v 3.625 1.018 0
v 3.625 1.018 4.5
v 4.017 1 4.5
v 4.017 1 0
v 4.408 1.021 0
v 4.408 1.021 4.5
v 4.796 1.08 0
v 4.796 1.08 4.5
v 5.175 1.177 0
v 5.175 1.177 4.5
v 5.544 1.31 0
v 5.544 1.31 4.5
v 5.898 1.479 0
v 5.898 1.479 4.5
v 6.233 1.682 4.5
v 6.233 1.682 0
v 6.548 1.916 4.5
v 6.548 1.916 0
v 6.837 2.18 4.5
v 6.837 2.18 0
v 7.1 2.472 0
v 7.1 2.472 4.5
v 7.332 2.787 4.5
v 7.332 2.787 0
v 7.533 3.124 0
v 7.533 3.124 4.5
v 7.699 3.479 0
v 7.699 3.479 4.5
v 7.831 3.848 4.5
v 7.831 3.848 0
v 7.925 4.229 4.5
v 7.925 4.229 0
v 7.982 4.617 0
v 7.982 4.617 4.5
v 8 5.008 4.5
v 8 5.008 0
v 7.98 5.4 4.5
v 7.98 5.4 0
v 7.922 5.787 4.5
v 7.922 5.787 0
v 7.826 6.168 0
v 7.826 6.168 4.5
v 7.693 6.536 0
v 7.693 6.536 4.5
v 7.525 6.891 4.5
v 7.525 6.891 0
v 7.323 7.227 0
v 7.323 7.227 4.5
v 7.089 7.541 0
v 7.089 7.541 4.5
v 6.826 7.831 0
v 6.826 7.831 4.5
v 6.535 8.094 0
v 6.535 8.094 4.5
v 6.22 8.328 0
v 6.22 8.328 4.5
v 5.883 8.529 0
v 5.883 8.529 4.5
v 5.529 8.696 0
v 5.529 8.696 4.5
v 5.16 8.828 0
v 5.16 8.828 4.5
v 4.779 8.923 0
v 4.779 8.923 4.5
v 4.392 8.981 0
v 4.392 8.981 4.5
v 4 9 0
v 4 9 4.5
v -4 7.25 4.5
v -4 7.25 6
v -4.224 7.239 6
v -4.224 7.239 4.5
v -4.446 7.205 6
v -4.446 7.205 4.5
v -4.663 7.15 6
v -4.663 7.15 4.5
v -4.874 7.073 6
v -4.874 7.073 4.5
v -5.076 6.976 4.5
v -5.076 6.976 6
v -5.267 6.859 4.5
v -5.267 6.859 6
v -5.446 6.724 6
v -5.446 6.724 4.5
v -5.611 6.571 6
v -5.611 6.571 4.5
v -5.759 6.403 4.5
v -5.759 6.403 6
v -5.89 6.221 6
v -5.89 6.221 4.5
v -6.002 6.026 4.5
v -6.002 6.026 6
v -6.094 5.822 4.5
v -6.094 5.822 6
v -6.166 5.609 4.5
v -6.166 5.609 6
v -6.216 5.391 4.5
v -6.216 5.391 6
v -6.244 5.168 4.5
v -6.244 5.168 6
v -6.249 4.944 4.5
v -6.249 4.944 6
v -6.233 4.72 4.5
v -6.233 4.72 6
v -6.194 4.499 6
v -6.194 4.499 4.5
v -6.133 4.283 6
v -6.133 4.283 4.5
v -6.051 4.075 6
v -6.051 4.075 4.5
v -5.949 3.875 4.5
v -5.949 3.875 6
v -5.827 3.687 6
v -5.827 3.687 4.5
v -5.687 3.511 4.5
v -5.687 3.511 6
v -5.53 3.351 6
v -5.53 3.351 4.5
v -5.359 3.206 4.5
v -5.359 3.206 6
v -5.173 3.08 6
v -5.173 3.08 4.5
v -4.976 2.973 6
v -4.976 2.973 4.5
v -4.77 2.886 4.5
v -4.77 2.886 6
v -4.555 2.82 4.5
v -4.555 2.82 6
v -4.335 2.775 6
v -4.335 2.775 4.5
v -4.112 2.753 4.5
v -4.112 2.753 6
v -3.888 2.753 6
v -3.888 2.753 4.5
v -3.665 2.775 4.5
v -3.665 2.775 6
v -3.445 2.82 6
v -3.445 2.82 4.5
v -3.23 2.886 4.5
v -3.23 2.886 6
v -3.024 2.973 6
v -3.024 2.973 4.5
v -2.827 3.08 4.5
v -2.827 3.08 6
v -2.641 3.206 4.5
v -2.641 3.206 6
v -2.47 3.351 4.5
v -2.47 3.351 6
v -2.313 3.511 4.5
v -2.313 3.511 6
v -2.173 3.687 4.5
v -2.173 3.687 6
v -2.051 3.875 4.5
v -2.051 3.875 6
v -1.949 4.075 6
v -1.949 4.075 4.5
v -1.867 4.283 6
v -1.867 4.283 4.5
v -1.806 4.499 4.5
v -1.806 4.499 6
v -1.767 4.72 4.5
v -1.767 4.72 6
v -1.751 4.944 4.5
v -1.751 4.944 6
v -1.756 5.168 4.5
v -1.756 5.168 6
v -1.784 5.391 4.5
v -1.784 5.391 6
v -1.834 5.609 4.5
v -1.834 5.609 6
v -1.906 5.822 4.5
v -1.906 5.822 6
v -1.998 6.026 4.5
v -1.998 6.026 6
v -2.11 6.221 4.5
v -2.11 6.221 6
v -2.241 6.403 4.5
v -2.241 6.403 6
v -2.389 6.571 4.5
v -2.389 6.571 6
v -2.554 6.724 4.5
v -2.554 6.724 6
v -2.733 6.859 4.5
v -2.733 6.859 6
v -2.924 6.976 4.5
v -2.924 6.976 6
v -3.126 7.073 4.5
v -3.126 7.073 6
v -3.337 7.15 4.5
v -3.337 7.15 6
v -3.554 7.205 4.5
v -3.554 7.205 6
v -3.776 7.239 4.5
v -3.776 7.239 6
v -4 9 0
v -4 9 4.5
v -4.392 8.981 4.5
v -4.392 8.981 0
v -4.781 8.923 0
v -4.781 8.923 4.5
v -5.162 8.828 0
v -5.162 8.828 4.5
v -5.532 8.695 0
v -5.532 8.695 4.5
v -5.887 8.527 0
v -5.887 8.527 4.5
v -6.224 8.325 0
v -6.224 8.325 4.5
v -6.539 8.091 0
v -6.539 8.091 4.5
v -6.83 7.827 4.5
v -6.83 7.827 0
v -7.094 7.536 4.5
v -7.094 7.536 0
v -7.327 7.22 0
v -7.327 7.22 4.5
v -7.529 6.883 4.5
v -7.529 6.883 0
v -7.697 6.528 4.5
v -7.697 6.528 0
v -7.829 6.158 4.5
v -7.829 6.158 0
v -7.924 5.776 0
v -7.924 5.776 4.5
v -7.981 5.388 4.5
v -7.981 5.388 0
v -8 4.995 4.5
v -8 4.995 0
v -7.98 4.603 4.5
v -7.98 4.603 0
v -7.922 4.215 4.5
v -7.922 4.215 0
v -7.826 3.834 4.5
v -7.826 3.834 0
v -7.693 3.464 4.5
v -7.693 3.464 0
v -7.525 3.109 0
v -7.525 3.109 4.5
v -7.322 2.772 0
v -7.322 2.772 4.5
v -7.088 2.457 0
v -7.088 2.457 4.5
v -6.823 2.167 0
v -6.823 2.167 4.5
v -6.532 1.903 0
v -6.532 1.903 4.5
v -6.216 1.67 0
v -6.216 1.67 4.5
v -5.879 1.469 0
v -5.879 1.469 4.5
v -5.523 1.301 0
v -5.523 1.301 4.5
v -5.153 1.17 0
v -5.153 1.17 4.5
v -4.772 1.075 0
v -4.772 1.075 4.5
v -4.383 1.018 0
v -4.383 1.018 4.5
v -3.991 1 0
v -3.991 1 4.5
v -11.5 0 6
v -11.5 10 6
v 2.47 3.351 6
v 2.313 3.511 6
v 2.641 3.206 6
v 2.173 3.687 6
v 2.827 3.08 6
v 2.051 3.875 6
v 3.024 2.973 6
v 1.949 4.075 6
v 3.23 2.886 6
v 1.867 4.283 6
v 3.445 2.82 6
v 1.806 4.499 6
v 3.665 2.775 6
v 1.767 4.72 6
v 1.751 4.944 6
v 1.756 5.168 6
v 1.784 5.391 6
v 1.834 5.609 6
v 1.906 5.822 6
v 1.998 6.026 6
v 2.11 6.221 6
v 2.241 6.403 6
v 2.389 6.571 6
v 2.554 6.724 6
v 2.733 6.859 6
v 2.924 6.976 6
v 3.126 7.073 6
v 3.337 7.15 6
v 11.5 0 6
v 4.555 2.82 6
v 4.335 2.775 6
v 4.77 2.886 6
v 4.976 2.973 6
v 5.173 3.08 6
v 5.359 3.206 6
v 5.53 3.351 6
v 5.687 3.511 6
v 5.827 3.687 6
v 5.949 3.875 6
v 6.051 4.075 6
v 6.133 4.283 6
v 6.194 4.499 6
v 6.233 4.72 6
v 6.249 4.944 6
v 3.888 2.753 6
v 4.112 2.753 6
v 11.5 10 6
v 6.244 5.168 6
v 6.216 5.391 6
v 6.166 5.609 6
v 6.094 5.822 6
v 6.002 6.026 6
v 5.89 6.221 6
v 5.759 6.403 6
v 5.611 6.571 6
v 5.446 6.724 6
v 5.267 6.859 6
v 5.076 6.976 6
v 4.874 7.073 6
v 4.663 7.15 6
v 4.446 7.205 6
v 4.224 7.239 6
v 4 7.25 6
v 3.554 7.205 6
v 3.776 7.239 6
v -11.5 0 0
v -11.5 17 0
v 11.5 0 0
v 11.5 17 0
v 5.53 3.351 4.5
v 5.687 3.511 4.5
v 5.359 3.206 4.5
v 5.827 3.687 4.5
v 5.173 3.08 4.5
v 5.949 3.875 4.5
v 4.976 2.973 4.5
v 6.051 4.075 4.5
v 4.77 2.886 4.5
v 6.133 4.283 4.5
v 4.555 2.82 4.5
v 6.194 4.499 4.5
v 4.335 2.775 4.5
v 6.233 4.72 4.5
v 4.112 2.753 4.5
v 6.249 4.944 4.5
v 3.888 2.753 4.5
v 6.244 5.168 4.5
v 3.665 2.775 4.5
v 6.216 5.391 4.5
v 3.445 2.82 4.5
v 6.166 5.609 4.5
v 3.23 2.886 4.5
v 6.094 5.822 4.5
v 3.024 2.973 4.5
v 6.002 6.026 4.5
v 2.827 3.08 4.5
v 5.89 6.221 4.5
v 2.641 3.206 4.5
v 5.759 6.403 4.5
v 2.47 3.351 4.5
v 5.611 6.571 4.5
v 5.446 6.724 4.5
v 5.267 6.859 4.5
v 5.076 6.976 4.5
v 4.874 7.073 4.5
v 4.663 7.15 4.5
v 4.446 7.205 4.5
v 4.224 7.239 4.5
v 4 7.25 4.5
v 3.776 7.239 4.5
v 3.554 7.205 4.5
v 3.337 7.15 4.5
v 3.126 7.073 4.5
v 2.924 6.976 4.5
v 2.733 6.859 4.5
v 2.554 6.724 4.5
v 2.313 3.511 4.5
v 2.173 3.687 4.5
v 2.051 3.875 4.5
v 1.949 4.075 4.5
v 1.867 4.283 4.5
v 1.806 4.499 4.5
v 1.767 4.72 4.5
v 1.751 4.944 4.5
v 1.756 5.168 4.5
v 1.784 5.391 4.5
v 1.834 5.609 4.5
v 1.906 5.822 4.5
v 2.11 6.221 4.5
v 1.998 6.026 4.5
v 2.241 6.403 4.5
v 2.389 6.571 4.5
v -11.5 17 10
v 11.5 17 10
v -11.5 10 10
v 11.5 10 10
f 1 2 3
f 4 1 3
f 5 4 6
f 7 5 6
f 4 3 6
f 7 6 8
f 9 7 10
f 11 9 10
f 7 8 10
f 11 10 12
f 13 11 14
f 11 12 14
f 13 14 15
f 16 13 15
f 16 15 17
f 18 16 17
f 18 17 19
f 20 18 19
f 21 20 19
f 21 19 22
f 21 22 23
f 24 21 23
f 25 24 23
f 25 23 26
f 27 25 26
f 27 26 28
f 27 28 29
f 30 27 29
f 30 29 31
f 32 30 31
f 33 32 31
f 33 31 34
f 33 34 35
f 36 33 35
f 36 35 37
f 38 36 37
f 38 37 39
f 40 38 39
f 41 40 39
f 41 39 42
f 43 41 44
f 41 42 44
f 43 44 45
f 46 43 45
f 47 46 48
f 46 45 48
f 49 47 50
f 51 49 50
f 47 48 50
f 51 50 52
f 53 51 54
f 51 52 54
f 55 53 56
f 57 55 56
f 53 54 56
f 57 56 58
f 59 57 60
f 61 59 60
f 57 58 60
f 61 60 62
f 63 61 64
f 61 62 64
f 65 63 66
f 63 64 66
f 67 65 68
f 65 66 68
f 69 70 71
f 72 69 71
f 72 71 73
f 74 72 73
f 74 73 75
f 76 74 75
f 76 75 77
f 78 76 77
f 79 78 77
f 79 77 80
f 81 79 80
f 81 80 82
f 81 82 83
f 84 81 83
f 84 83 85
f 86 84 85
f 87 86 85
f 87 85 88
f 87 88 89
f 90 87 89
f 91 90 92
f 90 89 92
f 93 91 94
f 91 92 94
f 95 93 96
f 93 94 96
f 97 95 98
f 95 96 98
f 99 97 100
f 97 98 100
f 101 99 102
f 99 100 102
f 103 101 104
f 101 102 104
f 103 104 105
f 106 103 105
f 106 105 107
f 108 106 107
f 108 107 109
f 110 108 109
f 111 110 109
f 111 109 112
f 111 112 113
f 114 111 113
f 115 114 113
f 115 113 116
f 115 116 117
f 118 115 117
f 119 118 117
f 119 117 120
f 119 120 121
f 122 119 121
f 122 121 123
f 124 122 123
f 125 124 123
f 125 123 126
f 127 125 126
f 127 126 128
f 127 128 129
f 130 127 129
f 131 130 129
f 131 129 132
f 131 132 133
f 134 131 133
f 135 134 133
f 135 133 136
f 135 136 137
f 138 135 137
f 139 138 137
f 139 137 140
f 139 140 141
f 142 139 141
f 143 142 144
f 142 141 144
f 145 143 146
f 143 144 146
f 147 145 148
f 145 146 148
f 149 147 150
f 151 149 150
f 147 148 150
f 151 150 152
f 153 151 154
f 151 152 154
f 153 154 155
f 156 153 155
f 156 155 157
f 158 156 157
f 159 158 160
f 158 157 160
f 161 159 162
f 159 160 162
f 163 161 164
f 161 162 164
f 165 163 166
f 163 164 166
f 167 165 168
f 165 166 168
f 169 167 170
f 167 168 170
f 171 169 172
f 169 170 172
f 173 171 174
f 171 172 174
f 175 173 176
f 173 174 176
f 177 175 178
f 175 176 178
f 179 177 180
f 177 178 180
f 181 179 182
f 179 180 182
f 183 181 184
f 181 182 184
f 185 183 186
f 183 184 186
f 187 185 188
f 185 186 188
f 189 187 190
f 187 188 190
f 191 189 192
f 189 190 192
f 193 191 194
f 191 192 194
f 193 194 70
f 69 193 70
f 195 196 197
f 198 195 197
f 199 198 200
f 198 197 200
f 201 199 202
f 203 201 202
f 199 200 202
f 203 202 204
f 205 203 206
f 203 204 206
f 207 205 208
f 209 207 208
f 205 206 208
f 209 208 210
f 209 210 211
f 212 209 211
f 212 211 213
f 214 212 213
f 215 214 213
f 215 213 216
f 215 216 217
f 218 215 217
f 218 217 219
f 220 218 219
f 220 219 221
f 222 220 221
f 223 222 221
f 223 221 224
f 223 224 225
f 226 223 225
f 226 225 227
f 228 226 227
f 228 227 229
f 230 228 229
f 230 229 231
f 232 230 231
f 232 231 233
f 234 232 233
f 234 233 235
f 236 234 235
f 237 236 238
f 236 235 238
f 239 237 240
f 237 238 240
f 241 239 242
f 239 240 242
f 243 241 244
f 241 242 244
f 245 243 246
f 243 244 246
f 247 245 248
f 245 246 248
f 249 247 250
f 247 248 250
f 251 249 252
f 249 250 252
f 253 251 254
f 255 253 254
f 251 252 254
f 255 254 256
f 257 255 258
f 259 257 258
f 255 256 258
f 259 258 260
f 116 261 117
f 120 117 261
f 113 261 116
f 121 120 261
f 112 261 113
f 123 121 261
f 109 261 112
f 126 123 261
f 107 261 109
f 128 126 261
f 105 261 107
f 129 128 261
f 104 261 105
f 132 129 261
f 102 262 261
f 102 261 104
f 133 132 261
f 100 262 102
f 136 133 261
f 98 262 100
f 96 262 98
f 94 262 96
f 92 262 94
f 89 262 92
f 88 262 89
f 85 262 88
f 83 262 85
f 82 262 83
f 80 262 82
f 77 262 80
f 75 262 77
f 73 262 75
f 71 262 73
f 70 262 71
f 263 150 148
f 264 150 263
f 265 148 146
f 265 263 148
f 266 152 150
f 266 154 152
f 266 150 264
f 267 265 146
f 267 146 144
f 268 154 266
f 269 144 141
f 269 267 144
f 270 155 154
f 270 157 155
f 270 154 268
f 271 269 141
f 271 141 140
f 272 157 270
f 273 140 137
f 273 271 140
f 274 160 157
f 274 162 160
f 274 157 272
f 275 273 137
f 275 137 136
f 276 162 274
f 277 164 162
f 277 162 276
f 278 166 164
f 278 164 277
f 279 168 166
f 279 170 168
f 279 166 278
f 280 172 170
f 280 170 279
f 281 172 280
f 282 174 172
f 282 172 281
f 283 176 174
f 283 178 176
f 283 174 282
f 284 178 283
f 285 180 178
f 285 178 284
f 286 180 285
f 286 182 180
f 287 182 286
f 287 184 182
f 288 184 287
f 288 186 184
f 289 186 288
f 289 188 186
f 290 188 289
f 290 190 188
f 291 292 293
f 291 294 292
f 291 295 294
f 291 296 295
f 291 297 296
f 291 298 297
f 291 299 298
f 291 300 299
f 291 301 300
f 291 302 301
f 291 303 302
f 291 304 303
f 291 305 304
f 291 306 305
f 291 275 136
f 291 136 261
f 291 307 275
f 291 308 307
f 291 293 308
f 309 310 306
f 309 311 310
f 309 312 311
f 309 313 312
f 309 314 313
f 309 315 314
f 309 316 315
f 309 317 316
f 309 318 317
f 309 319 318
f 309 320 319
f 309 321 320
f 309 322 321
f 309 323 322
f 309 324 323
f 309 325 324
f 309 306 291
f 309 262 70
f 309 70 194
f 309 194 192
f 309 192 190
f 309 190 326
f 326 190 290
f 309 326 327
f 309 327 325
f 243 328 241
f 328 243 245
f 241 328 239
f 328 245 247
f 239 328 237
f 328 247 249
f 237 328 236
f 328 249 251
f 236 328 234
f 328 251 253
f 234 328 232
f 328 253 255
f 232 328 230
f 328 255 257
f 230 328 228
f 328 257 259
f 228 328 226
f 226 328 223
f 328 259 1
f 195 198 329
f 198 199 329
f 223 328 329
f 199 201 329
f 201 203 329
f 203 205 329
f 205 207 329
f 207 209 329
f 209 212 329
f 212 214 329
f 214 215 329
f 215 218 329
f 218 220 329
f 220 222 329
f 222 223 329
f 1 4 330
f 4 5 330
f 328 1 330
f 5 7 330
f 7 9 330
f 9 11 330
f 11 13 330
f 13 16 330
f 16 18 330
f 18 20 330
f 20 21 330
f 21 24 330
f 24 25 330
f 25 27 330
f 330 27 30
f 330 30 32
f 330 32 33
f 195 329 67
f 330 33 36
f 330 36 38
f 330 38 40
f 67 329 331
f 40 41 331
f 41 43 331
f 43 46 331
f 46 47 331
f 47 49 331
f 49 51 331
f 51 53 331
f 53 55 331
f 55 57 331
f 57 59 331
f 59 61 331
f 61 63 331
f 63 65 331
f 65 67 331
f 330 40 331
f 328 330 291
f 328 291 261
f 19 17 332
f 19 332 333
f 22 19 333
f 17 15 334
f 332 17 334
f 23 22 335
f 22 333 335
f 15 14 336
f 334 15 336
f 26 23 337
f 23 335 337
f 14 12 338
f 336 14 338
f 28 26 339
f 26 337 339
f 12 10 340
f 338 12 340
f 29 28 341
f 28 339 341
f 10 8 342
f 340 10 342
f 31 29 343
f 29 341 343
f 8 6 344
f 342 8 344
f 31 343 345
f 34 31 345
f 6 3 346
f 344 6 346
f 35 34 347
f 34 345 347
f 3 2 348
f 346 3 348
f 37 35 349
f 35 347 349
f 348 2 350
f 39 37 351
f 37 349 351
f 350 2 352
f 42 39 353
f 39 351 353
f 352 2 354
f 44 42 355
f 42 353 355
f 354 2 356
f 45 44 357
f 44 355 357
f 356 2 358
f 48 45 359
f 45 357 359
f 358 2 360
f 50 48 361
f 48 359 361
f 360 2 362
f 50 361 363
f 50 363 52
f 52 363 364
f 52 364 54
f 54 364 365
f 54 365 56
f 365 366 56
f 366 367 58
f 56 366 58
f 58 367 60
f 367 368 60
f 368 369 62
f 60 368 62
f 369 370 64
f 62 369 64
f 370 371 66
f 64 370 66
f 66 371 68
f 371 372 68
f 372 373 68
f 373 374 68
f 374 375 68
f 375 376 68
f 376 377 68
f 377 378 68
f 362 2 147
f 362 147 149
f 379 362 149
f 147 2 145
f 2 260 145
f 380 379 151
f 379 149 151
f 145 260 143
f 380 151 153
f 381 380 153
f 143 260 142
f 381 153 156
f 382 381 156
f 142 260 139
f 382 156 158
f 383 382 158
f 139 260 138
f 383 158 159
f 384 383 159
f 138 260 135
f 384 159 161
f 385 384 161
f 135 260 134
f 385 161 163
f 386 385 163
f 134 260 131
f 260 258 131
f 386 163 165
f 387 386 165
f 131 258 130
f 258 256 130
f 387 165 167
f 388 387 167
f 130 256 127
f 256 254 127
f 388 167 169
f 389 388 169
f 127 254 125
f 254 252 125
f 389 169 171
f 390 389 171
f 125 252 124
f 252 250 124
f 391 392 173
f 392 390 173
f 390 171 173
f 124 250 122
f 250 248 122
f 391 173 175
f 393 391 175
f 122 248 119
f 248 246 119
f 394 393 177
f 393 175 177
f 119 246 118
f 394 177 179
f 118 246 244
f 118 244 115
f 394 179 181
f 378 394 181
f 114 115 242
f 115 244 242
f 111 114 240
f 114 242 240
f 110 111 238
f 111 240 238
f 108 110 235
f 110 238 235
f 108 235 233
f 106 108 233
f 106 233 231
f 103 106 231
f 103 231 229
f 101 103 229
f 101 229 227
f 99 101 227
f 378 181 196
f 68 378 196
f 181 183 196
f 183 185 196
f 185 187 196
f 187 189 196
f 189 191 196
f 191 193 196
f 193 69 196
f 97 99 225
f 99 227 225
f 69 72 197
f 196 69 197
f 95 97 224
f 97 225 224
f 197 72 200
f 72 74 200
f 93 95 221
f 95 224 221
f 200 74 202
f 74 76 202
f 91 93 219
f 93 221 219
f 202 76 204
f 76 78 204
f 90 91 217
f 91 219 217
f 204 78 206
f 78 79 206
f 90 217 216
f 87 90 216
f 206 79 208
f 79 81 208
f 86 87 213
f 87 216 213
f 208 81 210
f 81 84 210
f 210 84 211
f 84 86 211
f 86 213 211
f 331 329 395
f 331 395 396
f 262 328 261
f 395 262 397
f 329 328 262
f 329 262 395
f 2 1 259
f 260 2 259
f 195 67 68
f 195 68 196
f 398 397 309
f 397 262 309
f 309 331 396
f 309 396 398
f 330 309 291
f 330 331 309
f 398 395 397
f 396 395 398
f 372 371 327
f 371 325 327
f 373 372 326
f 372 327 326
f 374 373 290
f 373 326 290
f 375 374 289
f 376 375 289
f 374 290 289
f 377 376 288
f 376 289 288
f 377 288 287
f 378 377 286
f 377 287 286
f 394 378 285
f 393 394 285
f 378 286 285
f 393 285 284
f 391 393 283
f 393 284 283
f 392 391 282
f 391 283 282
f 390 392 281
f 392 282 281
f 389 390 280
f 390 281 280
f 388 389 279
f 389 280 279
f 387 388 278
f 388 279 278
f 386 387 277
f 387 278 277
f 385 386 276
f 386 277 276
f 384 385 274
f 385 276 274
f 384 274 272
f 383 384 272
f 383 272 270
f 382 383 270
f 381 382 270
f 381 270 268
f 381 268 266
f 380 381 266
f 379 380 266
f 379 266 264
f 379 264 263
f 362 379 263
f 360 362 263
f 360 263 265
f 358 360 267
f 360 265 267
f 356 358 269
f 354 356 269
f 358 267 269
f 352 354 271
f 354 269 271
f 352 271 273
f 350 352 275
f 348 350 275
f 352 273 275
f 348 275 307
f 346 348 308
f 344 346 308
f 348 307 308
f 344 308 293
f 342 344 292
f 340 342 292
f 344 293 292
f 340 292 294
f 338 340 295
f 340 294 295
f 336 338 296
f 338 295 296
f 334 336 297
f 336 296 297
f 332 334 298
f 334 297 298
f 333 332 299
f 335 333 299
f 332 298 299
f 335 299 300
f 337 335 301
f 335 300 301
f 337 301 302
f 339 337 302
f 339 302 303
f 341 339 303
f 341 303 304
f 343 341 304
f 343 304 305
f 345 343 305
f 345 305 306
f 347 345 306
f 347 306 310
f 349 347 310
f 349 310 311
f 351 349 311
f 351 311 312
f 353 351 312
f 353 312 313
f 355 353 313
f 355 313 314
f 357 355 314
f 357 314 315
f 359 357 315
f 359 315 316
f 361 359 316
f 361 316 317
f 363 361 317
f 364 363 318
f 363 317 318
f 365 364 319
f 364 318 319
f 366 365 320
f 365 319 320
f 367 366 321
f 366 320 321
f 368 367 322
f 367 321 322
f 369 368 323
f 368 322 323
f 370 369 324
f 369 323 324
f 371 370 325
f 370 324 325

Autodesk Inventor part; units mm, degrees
ref_plane "YZ Plane" through (0, 0, 0) normal (1, 0, 0) x (0, 1, 0)
ref_plane "XZ Plane" through (0, 0, 0) normal (0, 1, 0) x (-1, 0, 0)
ref_plane "XY Plane" through (0, 0, 0) normal (0, 0, 1) x (1, 0, 0)
sketch "スケッチ1" plane through (0, 0, 0) normal (0, 0, 1) x (1, 0, 0)
  line L0 (-11.5, 17) -> (11.5, 17)
  line L1 (11.5, 17) -> (11.5, 0)
  line L2 (11.5, 0) -> (-11.5, 0)
  line L3 (-11.5, 0) -> (-11.5, 17)
  point P0 (0, 0)
  point P1 (0, 0)
  dimension "d0" = 23
  dimension "d1" = 17
extrude "押し出し1" add sketch "スケッチ1" along normal blind 6
sketch "スケッチ5" plane through (0, 0, 0) normal (0, 0, -1) x (-1, 0, 0)
  line L0 (-11.5, 0) -> (11.5, 0) projected
  point P0 (0, 0)
  point P1 (-4, 5)
  point P2 (4, 5)
  dimension "d13" = 4
  dimension "d14" = 4
  dimension "d15" = 5
hole "穴1" at (4, 5, 0) at (-4, 5, 0) direction (0, 0, 1) diameter 4.5 end through all counterbore diameter 8 counterbore depth 4.5
sketch "スケッチ6" plane through (0, 0, 0) normal (0, 0, -1) x (-1, 0, 0)
  circle A0 centre (4, 5) radius 4 projected
  circle A1 centre (-4, 5) radius 4 projected
  line L0 (-4, 9) -> (4, 9)
  line L1 (-3.6249, 1.0176) -> (3.9907, 1)
  point P0 (0, 5)
  point P1 (0, 0)
extrude "押し出し5" cut sketch "スケッチ6" against normal up to surface (4.5 mm away) contours A0 A1 L0 | L1 A1 A0
sketch "スケッチ9" plane through (0, 0, 6) normal (0, 0, 1) x (1, 0, 0)
  line L0 (11.5, 17) -> (11.5, 0) projected
  line L1 (-11.5, 17) -> (11.5, 17) projected
  line L2 (-11.5, 0) -> (-11.5, 17) projected
  line L3 (11.5, 0) -> (-11.5, 0) projected
  line L4 (-11.5, 10) -> (11.5, 10)
  point P0 (0, 0)
  dimension "d32" = 10
extrude "押し出し8" add sketch "スケッチ9" along normal blind 4 contours L0 L4 L2 L1
equation "\"d14\" = d13"
properties part number "05" material "SUS303"
